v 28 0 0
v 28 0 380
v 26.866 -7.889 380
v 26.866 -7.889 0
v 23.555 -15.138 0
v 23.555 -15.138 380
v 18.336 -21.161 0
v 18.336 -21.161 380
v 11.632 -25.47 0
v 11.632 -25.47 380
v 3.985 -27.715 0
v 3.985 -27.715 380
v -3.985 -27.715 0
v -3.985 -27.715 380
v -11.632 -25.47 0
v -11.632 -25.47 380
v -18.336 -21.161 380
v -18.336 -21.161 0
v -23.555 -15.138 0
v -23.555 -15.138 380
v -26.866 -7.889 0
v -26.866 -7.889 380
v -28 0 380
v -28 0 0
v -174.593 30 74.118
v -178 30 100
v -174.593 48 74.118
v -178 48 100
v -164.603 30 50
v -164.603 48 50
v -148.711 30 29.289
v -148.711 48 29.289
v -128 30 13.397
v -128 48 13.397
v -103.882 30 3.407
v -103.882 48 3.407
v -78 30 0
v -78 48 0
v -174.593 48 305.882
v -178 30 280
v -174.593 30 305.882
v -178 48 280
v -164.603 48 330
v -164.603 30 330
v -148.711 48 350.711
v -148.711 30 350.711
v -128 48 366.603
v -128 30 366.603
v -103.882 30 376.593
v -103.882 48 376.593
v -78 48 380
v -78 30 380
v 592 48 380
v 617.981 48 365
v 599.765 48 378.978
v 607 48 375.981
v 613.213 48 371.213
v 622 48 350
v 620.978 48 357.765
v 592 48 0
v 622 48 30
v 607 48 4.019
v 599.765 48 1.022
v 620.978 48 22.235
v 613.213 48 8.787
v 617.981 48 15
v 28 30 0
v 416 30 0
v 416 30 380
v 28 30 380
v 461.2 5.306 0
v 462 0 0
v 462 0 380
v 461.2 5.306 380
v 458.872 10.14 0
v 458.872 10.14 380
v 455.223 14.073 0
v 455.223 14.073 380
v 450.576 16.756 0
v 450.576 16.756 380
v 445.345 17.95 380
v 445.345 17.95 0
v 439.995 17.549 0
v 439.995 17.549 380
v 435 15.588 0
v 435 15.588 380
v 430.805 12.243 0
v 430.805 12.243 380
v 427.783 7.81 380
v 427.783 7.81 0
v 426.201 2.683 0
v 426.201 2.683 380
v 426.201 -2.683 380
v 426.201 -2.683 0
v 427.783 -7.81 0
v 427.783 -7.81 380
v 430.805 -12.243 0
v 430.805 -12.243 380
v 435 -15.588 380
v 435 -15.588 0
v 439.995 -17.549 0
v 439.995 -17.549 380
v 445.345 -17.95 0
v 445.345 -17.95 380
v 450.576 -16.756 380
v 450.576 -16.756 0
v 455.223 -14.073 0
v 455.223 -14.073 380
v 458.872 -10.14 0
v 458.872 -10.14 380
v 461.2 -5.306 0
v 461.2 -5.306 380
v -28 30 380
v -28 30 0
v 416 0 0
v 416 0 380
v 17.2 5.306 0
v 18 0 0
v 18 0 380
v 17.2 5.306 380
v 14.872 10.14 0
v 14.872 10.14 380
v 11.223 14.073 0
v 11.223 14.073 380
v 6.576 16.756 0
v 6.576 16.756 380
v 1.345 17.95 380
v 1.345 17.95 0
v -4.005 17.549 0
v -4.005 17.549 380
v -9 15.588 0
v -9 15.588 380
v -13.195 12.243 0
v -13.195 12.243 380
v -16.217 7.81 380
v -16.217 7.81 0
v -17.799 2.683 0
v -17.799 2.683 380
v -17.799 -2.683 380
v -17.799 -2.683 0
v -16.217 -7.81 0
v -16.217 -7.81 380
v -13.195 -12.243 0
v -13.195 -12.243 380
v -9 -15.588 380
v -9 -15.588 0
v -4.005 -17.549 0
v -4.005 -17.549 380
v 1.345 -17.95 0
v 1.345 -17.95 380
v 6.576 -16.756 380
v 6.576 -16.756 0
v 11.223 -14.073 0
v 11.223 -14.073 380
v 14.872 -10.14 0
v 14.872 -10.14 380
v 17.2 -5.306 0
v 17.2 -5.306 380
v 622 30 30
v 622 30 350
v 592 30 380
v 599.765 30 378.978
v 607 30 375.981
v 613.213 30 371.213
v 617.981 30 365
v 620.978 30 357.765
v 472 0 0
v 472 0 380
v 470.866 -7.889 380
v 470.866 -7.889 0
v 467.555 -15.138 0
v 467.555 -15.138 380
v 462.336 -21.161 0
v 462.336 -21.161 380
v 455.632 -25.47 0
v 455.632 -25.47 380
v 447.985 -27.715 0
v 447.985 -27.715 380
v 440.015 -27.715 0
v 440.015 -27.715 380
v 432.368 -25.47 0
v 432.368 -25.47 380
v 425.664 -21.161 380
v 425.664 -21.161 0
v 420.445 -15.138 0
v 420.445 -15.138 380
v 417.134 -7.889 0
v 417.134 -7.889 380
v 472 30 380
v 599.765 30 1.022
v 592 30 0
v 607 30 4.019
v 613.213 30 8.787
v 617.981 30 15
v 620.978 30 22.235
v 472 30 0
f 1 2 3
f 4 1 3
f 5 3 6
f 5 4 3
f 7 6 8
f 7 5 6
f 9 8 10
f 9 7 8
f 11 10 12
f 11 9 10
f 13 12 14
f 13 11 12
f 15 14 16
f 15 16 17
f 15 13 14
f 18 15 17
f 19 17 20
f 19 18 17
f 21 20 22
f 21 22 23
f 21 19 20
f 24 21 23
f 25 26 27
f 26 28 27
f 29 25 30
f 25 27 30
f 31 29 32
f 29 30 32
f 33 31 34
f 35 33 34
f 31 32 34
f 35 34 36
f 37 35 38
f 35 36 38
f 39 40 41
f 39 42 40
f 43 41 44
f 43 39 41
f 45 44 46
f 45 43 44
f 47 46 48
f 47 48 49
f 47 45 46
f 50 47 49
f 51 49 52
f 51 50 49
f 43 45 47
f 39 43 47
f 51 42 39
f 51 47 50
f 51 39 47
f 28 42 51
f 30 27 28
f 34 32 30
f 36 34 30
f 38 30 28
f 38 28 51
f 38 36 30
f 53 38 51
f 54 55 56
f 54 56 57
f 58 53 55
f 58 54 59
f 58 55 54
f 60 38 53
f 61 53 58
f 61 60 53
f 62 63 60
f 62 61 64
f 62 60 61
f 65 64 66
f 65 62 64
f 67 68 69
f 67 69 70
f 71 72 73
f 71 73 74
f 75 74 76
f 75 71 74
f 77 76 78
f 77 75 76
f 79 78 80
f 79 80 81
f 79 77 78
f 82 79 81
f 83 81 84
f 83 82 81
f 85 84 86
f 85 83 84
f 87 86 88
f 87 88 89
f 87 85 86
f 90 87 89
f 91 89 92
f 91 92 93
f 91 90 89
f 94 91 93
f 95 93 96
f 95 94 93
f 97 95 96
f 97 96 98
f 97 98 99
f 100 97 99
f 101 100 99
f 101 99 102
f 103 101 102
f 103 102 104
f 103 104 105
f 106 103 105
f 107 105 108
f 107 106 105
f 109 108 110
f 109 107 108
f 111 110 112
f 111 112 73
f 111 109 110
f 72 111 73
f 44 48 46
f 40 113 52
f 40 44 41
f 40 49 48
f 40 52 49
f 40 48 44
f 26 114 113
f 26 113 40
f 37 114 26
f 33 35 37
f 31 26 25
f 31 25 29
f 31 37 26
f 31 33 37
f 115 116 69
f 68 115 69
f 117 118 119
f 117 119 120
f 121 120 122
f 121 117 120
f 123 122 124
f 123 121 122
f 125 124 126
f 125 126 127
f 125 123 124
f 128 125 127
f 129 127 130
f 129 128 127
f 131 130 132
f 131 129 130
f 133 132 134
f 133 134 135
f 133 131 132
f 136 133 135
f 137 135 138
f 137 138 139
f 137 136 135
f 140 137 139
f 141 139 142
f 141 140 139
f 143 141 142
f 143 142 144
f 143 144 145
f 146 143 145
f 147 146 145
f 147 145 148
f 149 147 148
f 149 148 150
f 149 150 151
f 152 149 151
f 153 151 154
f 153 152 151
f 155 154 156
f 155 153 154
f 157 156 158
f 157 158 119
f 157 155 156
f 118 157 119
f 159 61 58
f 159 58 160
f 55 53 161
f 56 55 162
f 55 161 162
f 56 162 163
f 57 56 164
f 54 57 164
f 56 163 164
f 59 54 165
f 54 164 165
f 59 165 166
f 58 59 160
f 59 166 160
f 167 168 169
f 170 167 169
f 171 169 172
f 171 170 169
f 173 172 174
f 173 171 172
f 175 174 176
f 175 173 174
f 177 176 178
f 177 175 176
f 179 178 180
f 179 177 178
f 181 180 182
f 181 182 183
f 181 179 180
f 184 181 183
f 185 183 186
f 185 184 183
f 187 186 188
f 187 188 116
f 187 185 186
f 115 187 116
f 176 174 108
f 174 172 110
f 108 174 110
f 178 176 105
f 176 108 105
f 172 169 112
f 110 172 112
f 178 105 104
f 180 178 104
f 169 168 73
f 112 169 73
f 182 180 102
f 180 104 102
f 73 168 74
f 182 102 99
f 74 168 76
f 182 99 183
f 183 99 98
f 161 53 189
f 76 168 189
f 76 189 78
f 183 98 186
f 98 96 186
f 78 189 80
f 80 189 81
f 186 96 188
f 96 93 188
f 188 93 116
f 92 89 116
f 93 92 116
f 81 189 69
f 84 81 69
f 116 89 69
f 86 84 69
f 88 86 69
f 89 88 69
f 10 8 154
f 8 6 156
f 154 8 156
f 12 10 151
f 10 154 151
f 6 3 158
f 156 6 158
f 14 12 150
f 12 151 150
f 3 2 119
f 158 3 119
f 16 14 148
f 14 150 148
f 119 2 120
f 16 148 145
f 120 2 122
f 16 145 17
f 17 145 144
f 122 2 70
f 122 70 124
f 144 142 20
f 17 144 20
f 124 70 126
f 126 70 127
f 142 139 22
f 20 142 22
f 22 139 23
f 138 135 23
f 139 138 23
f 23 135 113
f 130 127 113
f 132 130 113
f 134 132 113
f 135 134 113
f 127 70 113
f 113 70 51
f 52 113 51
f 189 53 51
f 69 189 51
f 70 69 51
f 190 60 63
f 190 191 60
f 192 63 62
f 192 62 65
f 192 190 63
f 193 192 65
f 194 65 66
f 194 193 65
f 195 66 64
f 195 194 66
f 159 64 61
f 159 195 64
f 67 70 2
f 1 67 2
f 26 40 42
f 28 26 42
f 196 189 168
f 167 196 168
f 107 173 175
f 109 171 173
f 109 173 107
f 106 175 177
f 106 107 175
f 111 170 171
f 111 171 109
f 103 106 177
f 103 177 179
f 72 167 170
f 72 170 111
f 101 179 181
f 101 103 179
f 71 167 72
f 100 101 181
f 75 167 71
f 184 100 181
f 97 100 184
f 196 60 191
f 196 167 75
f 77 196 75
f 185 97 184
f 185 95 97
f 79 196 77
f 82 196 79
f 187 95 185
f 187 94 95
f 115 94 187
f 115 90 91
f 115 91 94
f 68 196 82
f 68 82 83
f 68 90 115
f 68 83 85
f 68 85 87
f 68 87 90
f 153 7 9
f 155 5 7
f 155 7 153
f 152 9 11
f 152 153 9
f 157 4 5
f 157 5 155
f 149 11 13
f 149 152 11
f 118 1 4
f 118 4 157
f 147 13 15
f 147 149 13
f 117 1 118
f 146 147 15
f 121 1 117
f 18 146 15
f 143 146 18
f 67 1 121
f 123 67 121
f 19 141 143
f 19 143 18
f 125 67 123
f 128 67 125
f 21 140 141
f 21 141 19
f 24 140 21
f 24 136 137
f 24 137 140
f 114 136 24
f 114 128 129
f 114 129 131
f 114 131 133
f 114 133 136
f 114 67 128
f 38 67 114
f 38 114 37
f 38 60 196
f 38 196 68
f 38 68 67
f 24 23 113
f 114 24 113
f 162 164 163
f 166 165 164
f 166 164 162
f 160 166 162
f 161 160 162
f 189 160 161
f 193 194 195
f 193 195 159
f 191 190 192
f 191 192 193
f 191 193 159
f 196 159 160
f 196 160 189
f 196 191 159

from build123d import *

# Parameters (mm, degrees)
IZIM1_R                     = 18
Y_KSEKLIK_EKSTR_ZYON1_DEPTH = 380
RADYUS1_R                   = 100
RADYUS2_R                   = 30


with BuildPart() as part:
    # Çizim1 → Yükseklik-Ekstrüzyon1 (new body)
    with BuildSketch(Plane.XY):
        with BuildLine():
            Line((-28, 0), (-28, 30))
            Line((-28, 30), (-178, 30))
            Line((-178, 30), (-178, 48))
            Line((-178, 48), (622, 48))
            Line((622, 48), (622, 30))
            Line((622, 30), (472, 30))
            Line((472, 30), (472, 0))
            ThreePointArc((472, 0), (444, -28), (416, 0))
            Line((416, 0), (416, 30))
            Line((416, 30), (28, 30))
            Line((28, 30), (28, 0))
            ThreePointArc((28, 0), (0, -28), (-28, 0))
        make_face()
        Circle(IZIM1_R, mode=Mode.SUBTRACT)
        with Locations((444, 0)):
            Circle(IZIM1_R, mode=Mode.SUBTRACT)
    extrude(amount=Y_KSEKLIK_EKSTR_ZYON1_DEPTH)

    # Radyus1
    radyus1_edges = [part.edges().sort_by_distance(p)[0] for p in [
        (-178, 39, 0),
        (-178, 39, 380),
    ]]
    fillet(radyus1_edges, radius=RADYUS1_R)

    # Radyus2
    radyus2_edges = [part.edges().sort_by_distance(p)[0] for p in [
        (622, 39, 0),
        (622, 39, 380),
    ]]
    fillet(radyus2_edges, radius=RADYUS2_R)


solid = part.part
